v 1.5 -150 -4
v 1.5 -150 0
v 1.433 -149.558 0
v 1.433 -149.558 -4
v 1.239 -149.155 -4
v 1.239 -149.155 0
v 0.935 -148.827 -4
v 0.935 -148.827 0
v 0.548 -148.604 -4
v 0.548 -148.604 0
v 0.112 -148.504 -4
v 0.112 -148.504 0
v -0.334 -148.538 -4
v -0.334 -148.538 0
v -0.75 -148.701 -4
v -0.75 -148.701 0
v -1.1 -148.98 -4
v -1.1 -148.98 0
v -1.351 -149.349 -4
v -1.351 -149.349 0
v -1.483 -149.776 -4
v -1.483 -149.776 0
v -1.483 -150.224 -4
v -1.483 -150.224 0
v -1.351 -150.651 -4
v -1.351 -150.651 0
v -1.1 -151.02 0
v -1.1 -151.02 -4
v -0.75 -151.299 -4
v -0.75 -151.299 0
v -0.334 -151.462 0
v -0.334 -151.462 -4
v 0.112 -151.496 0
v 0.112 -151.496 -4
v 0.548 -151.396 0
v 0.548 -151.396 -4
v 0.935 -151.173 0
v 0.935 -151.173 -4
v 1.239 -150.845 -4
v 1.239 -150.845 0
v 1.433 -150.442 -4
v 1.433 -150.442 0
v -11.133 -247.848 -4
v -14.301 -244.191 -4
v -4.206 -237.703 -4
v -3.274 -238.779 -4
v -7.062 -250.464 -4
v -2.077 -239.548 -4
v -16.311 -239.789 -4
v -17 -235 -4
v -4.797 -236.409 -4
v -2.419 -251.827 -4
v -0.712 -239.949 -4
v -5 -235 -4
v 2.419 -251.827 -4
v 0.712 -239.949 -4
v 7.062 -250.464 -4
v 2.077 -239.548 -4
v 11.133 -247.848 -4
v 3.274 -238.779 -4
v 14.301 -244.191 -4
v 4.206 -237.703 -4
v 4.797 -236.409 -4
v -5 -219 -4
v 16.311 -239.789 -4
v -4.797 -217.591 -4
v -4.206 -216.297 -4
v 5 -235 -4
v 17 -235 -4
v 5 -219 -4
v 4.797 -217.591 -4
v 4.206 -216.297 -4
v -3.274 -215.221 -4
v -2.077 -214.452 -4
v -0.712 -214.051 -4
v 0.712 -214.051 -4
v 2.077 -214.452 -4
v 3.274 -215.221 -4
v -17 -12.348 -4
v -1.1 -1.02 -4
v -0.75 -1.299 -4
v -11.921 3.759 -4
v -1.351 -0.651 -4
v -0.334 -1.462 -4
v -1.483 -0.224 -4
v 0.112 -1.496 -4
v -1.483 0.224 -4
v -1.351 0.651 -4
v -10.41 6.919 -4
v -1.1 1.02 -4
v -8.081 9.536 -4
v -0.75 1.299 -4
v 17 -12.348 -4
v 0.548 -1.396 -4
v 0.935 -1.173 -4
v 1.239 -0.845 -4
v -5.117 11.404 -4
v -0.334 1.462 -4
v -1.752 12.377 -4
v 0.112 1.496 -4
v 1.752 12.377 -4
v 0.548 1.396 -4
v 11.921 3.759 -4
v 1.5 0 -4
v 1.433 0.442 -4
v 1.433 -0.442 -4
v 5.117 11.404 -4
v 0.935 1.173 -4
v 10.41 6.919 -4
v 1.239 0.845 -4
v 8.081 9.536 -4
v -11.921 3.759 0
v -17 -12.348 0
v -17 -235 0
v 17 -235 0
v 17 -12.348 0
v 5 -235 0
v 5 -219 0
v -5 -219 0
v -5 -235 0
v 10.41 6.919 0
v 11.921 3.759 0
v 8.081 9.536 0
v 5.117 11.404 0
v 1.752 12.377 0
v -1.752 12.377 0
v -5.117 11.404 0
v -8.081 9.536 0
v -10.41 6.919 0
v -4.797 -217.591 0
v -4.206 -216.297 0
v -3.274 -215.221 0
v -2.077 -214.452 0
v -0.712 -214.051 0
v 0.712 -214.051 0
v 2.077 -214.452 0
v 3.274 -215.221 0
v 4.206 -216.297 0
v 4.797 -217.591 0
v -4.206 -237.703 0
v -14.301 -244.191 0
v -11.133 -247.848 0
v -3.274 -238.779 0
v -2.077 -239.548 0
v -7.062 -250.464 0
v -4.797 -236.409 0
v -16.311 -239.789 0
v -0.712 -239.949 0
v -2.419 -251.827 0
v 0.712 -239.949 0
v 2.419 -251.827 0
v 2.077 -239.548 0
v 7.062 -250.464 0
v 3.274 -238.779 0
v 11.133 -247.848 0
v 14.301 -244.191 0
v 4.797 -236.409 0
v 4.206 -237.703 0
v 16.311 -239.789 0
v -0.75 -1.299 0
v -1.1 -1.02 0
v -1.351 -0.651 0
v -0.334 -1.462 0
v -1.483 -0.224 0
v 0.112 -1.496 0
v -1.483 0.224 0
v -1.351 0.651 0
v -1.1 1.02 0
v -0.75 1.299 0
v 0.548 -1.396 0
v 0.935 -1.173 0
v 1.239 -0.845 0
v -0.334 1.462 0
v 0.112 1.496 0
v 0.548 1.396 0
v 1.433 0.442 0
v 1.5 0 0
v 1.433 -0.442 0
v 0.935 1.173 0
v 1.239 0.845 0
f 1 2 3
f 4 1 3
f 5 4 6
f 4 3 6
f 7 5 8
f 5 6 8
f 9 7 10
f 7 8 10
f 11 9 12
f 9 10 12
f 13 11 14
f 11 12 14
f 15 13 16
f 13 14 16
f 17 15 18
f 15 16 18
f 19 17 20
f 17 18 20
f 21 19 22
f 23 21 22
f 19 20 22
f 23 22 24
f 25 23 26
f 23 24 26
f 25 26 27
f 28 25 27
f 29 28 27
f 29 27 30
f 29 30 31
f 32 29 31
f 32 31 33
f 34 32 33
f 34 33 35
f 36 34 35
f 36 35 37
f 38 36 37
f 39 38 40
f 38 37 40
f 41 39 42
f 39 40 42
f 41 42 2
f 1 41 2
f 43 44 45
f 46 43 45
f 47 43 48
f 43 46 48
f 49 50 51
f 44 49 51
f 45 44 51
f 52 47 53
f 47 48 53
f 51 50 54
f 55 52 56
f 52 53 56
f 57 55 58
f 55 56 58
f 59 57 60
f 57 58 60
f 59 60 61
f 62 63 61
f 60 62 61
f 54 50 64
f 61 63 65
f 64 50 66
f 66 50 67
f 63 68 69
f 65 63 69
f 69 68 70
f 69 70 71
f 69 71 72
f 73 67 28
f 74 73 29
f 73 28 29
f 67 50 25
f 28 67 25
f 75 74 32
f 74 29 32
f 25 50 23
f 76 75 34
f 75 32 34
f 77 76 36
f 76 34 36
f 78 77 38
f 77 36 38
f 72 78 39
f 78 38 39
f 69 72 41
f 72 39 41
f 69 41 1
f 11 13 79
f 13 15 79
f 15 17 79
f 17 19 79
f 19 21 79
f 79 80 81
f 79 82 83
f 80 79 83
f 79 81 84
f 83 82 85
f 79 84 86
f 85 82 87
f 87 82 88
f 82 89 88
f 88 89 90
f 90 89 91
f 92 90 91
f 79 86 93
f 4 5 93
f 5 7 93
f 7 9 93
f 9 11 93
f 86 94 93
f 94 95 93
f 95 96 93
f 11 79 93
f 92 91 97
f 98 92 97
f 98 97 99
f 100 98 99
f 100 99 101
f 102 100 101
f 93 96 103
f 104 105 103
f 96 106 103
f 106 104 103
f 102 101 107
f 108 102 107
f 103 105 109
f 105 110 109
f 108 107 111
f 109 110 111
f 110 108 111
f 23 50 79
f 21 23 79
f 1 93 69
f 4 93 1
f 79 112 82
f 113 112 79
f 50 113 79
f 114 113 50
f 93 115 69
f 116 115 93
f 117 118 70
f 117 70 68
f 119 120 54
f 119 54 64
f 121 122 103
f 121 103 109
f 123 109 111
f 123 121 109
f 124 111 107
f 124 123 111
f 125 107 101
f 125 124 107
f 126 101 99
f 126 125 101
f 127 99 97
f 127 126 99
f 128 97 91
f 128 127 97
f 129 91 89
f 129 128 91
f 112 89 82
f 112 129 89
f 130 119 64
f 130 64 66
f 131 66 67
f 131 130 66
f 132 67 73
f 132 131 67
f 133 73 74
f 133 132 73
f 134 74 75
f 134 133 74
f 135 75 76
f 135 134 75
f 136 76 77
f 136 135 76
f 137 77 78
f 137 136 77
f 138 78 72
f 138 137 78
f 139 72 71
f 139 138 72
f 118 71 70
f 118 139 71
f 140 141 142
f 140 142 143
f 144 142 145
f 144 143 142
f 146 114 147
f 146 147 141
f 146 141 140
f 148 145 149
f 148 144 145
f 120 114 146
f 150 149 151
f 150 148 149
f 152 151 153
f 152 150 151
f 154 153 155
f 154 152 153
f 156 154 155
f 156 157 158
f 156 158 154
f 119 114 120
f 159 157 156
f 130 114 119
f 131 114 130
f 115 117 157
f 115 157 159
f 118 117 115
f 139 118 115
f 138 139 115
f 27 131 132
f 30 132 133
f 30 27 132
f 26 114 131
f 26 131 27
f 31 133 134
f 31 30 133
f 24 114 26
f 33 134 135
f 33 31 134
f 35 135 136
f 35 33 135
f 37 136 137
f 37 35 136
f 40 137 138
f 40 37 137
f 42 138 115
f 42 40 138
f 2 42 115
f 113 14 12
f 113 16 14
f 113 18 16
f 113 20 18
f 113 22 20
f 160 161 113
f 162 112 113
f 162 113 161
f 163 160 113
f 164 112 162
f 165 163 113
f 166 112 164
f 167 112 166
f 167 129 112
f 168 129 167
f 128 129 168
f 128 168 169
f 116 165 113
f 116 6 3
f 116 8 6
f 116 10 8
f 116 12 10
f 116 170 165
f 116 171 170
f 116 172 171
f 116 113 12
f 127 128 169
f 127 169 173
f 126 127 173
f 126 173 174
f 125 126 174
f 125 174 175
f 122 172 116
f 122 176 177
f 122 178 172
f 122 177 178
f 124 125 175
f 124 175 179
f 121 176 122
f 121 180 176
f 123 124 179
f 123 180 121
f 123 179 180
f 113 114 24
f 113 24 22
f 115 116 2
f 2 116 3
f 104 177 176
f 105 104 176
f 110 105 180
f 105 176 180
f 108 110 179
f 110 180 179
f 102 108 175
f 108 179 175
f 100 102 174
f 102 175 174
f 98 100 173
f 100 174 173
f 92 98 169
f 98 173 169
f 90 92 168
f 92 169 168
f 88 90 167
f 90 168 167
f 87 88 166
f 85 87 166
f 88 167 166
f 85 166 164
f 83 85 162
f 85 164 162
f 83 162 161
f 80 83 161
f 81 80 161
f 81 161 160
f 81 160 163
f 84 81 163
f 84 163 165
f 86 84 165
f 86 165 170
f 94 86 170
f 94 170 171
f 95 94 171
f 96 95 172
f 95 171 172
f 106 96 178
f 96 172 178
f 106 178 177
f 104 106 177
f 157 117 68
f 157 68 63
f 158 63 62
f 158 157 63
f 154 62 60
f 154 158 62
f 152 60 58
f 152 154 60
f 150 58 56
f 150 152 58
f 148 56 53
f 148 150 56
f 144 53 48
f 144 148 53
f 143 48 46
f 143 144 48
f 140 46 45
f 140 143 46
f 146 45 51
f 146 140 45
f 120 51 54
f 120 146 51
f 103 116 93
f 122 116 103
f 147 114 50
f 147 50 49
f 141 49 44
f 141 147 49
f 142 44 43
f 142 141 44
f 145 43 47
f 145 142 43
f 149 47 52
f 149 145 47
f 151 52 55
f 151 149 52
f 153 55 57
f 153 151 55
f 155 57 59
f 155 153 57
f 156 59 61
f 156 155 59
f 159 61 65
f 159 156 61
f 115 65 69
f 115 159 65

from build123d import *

# Parameters (mm, degrees)
ESQUISSE1_R               = 1.5
T_LE_DE_BASE_PLI_E1_DEPTH = 4


# Sheet-metal steps are written as plain solids
with BuildPart() as part:
    # Esquisse1 → Tôle de base pliée1 (new body)
    with BuildSketch(Plane.XY):
        with BuildLine():
            Line((-17, -12.348242597), (-17, -235))
            ThreePointArc((-17, -235), (0, -252), (17, -235))
            Line((17, -235), (17, -12.348242597))
            Line((17, -12.348242597), (11.921461884, 3.758822494))
            ThreePointArc((11.921461884, 3.758822494), (0, 12.5), (-11.921461884, 3.758822494))
            Line((-11.921461884, 3.758822494), (-17, -12.348242597))
        make_face()
        Circle(ESQUISSE1_R, mode=Mode.SUBTRACT)
        with Locations((0, -150)):
            Circle(ESQUISSE1_R, mode=Mode.SUBTRACT)
        with BuildLine():
            Line((-5, -235), (-5, -219))
            ThreePointArc((-5, -219), (0, -214), (5, -219))
            Line((5, -219), (5, -235))
            ThreePointArc((5, -235), (0, -240), (-5, -235))
        make_face(mode=Mode.SUBTRACT)
    extrude(amount=-T_LE_DE_BASE_PLI_E1_DEPTH)


solid = part.part
